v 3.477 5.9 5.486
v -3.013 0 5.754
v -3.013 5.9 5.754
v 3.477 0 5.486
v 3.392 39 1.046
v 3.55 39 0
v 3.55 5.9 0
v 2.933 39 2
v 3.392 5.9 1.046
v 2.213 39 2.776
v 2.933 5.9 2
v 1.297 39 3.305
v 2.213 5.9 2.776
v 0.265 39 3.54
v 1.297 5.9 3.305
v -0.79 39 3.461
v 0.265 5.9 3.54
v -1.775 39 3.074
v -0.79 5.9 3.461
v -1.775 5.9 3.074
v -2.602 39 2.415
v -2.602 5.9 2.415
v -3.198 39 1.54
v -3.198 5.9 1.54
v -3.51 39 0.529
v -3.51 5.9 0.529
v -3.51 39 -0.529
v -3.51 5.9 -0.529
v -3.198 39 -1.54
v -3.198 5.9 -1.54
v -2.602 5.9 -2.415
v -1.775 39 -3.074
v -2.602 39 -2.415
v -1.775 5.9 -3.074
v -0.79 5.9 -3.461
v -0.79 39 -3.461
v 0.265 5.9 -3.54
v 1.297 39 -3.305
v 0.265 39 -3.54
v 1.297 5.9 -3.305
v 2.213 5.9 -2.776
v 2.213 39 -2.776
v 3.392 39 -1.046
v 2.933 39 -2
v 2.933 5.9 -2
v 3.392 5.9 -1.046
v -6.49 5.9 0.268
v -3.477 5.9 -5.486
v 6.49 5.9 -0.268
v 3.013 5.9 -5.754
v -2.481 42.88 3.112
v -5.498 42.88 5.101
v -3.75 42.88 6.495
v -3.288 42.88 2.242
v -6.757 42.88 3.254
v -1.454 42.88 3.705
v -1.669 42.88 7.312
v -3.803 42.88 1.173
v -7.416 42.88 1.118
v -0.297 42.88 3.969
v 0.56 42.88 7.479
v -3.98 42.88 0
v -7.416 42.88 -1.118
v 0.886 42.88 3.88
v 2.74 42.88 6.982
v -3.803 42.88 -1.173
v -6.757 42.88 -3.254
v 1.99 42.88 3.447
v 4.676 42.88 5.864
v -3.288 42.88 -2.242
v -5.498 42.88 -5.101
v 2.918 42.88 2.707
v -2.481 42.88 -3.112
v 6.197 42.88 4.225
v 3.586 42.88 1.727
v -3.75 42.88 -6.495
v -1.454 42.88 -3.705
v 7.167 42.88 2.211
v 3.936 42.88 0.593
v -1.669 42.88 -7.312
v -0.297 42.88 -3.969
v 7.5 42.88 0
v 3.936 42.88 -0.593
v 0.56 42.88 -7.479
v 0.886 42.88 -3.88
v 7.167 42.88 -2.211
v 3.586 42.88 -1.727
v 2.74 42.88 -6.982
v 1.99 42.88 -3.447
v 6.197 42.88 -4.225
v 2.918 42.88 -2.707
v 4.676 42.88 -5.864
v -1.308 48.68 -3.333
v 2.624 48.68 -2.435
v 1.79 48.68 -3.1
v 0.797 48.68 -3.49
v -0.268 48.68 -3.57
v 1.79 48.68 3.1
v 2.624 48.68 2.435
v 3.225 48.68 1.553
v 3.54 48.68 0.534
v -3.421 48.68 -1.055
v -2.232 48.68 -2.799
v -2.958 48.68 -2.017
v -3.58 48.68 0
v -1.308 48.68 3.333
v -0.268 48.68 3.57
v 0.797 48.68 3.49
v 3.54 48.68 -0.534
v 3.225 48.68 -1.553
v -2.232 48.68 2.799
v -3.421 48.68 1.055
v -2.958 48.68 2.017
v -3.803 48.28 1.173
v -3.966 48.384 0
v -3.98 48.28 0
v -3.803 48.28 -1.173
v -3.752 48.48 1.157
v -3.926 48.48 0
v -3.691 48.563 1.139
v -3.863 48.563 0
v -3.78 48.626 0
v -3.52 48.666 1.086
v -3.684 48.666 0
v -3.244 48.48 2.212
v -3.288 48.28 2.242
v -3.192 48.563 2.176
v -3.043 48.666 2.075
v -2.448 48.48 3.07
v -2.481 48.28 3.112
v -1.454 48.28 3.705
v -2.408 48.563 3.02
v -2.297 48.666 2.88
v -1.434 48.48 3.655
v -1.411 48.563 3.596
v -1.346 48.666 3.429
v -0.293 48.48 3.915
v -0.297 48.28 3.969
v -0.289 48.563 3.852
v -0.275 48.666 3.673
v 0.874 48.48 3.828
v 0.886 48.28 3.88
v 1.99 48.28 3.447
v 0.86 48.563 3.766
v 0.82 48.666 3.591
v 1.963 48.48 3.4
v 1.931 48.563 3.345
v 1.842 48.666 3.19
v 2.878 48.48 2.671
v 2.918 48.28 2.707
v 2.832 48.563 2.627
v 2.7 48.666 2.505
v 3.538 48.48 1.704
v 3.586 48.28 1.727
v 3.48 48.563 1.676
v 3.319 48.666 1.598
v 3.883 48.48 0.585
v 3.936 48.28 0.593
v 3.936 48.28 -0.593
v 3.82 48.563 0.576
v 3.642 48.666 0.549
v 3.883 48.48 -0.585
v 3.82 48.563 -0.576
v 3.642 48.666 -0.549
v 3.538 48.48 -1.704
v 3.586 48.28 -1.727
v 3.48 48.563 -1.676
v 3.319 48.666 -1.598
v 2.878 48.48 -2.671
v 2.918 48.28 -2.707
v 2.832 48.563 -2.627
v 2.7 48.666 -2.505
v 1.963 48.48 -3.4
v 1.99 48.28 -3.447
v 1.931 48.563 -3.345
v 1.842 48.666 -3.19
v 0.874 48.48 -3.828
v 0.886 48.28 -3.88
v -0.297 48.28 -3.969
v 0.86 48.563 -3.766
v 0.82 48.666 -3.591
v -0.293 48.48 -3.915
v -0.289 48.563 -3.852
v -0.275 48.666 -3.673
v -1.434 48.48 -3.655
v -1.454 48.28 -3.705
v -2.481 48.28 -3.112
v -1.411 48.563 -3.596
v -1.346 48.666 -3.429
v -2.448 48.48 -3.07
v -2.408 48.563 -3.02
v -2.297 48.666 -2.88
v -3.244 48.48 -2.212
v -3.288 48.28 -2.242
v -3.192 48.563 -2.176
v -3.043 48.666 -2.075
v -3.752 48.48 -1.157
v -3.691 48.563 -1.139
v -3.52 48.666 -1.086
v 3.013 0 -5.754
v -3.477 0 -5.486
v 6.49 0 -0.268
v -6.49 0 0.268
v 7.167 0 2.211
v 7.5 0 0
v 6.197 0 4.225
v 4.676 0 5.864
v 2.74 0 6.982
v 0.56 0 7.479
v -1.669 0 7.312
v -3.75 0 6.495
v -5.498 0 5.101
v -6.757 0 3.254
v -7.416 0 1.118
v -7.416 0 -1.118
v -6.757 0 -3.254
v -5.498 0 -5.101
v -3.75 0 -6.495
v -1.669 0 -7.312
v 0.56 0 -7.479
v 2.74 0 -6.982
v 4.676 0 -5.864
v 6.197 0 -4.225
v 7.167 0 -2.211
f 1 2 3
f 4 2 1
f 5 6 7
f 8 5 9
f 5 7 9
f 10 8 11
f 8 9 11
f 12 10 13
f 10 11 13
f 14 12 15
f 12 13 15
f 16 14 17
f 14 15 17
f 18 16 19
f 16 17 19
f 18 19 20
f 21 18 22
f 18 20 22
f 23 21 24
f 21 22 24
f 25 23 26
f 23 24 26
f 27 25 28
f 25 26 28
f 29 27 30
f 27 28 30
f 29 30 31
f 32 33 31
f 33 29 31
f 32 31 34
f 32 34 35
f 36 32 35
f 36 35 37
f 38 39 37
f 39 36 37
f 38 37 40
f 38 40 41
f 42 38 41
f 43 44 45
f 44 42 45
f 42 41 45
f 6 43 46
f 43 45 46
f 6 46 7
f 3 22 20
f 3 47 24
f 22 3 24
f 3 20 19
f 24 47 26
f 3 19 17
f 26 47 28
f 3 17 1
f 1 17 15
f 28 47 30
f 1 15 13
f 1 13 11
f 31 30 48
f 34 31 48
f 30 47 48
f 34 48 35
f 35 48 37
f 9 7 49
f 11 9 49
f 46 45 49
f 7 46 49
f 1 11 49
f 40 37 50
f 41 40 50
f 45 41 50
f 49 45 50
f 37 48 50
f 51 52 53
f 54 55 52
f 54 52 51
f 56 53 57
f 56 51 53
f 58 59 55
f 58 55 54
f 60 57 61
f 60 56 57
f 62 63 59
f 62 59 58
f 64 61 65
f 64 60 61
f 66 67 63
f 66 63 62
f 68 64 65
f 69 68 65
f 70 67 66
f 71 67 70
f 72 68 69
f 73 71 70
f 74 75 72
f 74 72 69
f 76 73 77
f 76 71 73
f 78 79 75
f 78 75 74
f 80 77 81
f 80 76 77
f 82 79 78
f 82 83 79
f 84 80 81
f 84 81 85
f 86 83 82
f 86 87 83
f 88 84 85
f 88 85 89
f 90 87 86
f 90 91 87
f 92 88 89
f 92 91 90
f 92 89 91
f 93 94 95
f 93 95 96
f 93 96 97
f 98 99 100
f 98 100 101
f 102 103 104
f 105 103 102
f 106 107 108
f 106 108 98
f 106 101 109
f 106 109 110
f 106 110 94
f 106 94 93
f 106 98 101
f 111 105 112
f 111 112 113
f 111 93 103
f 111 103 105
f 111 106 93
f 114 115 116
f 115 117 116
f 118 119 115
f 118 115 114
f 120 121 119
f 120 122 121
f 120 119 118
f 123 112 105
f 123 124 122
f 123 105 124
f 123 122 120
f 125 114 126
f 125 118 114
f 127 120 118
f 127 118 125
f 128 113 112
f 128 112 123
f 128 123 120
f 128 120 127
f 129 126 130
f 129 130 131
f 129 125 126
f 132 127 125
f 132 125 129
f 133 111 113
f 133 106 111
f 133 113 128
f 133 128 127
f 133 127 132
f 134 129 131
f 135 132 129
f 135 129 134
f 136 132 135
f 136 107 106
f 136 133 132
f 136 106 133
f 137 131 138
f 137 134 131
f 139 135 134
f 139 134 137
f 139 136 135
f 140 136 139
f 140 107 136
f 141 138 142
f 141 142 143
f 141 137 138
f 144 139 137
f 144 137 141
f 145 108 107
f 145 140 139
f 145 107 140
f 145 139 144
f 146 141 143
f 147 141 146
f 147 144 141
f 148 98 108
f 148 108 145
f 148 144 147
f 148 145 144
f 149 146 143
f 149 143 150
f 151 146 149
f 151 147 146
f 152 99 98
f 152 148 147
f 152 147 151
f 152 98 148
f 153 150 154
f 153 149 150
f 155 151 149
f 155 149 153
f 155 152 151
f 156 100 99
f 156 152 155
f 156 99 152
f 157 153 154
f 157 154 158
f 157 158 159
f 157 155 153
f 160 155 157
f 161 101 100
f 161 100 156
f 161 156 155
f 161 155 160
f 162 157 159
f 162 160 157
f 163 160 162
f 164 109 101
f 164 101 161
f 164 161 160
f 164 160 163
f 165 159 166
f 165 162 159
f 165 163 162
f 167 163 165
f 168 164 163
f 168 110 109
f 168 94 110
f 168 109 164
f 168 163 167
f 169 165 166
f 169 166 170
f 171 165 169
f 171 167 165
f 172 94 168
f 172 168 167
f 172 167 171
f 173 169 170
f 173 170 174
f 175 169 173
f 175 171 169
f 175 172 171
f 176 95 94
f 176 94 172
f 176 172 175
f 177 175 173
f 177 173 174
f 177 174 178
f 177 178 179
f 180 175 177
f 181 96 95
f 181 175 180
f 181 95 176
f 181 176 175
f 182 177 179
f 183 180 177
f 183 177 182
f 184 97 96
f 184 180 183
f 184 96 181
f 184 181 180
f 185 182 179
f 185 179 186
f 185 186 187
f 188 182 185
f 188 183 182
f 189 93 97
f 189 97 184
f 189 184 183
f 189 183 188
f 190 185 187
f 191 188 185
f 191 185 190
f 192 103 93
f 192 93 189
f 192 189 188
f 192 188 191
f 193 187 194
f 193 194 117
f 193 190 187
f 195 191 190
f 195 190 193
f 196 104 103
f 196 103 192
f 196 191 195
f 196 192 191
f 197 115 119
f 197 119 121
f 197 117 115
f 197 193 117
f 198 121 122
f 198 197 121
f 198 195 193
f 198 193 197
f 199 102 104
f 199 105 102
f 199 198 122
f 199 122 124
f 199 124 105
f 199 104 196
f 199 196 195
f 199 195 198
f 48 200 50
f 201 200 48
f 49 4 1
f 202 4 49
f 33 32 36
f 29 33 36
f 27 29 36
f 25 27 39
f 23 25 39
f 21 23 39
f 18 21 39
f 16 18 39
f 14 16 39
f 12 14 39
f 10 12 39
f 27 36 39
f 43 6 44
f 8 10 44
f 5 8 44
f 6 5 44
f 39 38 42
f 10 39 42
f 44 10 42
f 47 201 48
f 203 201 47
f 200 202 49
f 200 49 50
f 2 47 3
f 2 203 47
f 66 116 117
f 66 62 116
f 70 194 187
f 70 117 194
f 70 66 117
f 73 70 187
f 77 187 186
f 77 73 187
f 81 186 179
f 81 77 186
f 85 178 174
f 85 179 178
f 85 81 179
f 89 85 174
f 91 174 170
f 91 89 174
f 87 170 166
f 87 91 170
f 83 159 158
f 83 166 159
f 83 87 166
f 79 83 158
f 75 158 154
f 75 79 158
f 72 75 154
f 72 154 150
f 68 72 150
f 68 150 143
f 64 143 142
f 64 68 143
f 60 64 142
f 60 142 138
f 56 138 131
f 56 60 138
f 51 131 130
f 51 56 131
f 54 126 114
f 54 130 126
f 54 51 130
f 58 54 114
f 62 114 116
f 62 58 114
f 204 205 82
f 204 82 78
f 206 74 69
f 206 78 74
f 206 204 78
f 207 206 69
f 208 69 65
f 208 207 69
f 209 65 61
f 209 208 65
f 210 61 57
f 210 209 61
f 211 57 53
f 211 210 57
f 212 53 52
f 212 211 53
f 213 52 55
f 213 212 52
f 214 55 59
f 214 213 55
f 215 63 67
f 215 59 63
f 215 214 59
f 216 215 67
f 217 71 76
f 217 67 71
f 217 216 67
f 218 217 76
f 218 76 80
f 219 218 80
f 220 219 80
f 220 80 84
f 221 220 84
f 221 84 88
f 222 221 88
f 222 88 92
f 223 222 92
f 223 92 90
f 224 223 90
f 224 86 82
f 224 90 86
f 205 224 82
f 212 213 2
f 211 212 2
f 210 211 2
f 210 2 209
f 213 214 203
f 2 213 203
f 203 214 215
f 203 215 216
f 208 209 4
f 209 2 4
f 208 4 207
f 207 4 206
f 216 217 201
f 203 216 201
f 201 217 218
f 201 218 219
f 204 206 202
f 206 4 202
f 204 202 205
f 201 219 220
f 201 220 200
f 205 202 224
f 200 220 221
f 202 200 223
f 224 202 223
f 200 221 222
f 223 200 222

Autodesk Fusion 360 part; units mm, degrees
sketch "Sketch1" plane through (0, 0, 0) normal (0, 1, 0) x (1, 0, 0)
  circle A0 centre (0, 0) radius 7.5
  line L0 (6.4897, 0.2677) -> (3.013, 5.7541)
  line L1 (3.013, 5.7541) -> (-3.4767, 5.4864)
  line L2 (-3.4767, 5.4864) -> (-6.4897, -0.2677)
  line L3 (-6.4897, -0.2677) -> (-3.013, -5.7541)
  line L4 (-3.013, -5.7541) -> (3.4767, -5.4864)
  line L5 (3.4767, -5.4864) -> (6.4897, 0.2677)
  circle A1 centre (0, 0) radius 3.55
  dimension "d1" = 15
  dimension "d2" = 5.625
  dimension "d7" = 7.1
extrude "Extrude1" add sketch "Sketch1" along normal blind 42.88 contours A0 | L0 L1 L2 L3 L4 L5 | A1
extrude "Extrude2" cut sketch "Sketch1" along normal blind 5.9 contours L0 L1 L2 L3 L4 L5 | A1
extrude "Extrude3" cut sketch "Sketch1" along normal blind 39 contours A1
sketch "Sketch2" plane through (0, 42.88, 0) normal (0, 1, 0) x (-1, 0, 0)
  circle A0 centre (0, 0) radius 7.5
  circle A1 centre (0, 0) radius 3.98
  dimension "d10" = 7.96
extrude "Extrude4" add sketch "Sketch2" along normal blind 5.8 contours A1
fillet "Fillet1" radius 0.4 1 edges at (3.7107, 48.68, -1.4392)
